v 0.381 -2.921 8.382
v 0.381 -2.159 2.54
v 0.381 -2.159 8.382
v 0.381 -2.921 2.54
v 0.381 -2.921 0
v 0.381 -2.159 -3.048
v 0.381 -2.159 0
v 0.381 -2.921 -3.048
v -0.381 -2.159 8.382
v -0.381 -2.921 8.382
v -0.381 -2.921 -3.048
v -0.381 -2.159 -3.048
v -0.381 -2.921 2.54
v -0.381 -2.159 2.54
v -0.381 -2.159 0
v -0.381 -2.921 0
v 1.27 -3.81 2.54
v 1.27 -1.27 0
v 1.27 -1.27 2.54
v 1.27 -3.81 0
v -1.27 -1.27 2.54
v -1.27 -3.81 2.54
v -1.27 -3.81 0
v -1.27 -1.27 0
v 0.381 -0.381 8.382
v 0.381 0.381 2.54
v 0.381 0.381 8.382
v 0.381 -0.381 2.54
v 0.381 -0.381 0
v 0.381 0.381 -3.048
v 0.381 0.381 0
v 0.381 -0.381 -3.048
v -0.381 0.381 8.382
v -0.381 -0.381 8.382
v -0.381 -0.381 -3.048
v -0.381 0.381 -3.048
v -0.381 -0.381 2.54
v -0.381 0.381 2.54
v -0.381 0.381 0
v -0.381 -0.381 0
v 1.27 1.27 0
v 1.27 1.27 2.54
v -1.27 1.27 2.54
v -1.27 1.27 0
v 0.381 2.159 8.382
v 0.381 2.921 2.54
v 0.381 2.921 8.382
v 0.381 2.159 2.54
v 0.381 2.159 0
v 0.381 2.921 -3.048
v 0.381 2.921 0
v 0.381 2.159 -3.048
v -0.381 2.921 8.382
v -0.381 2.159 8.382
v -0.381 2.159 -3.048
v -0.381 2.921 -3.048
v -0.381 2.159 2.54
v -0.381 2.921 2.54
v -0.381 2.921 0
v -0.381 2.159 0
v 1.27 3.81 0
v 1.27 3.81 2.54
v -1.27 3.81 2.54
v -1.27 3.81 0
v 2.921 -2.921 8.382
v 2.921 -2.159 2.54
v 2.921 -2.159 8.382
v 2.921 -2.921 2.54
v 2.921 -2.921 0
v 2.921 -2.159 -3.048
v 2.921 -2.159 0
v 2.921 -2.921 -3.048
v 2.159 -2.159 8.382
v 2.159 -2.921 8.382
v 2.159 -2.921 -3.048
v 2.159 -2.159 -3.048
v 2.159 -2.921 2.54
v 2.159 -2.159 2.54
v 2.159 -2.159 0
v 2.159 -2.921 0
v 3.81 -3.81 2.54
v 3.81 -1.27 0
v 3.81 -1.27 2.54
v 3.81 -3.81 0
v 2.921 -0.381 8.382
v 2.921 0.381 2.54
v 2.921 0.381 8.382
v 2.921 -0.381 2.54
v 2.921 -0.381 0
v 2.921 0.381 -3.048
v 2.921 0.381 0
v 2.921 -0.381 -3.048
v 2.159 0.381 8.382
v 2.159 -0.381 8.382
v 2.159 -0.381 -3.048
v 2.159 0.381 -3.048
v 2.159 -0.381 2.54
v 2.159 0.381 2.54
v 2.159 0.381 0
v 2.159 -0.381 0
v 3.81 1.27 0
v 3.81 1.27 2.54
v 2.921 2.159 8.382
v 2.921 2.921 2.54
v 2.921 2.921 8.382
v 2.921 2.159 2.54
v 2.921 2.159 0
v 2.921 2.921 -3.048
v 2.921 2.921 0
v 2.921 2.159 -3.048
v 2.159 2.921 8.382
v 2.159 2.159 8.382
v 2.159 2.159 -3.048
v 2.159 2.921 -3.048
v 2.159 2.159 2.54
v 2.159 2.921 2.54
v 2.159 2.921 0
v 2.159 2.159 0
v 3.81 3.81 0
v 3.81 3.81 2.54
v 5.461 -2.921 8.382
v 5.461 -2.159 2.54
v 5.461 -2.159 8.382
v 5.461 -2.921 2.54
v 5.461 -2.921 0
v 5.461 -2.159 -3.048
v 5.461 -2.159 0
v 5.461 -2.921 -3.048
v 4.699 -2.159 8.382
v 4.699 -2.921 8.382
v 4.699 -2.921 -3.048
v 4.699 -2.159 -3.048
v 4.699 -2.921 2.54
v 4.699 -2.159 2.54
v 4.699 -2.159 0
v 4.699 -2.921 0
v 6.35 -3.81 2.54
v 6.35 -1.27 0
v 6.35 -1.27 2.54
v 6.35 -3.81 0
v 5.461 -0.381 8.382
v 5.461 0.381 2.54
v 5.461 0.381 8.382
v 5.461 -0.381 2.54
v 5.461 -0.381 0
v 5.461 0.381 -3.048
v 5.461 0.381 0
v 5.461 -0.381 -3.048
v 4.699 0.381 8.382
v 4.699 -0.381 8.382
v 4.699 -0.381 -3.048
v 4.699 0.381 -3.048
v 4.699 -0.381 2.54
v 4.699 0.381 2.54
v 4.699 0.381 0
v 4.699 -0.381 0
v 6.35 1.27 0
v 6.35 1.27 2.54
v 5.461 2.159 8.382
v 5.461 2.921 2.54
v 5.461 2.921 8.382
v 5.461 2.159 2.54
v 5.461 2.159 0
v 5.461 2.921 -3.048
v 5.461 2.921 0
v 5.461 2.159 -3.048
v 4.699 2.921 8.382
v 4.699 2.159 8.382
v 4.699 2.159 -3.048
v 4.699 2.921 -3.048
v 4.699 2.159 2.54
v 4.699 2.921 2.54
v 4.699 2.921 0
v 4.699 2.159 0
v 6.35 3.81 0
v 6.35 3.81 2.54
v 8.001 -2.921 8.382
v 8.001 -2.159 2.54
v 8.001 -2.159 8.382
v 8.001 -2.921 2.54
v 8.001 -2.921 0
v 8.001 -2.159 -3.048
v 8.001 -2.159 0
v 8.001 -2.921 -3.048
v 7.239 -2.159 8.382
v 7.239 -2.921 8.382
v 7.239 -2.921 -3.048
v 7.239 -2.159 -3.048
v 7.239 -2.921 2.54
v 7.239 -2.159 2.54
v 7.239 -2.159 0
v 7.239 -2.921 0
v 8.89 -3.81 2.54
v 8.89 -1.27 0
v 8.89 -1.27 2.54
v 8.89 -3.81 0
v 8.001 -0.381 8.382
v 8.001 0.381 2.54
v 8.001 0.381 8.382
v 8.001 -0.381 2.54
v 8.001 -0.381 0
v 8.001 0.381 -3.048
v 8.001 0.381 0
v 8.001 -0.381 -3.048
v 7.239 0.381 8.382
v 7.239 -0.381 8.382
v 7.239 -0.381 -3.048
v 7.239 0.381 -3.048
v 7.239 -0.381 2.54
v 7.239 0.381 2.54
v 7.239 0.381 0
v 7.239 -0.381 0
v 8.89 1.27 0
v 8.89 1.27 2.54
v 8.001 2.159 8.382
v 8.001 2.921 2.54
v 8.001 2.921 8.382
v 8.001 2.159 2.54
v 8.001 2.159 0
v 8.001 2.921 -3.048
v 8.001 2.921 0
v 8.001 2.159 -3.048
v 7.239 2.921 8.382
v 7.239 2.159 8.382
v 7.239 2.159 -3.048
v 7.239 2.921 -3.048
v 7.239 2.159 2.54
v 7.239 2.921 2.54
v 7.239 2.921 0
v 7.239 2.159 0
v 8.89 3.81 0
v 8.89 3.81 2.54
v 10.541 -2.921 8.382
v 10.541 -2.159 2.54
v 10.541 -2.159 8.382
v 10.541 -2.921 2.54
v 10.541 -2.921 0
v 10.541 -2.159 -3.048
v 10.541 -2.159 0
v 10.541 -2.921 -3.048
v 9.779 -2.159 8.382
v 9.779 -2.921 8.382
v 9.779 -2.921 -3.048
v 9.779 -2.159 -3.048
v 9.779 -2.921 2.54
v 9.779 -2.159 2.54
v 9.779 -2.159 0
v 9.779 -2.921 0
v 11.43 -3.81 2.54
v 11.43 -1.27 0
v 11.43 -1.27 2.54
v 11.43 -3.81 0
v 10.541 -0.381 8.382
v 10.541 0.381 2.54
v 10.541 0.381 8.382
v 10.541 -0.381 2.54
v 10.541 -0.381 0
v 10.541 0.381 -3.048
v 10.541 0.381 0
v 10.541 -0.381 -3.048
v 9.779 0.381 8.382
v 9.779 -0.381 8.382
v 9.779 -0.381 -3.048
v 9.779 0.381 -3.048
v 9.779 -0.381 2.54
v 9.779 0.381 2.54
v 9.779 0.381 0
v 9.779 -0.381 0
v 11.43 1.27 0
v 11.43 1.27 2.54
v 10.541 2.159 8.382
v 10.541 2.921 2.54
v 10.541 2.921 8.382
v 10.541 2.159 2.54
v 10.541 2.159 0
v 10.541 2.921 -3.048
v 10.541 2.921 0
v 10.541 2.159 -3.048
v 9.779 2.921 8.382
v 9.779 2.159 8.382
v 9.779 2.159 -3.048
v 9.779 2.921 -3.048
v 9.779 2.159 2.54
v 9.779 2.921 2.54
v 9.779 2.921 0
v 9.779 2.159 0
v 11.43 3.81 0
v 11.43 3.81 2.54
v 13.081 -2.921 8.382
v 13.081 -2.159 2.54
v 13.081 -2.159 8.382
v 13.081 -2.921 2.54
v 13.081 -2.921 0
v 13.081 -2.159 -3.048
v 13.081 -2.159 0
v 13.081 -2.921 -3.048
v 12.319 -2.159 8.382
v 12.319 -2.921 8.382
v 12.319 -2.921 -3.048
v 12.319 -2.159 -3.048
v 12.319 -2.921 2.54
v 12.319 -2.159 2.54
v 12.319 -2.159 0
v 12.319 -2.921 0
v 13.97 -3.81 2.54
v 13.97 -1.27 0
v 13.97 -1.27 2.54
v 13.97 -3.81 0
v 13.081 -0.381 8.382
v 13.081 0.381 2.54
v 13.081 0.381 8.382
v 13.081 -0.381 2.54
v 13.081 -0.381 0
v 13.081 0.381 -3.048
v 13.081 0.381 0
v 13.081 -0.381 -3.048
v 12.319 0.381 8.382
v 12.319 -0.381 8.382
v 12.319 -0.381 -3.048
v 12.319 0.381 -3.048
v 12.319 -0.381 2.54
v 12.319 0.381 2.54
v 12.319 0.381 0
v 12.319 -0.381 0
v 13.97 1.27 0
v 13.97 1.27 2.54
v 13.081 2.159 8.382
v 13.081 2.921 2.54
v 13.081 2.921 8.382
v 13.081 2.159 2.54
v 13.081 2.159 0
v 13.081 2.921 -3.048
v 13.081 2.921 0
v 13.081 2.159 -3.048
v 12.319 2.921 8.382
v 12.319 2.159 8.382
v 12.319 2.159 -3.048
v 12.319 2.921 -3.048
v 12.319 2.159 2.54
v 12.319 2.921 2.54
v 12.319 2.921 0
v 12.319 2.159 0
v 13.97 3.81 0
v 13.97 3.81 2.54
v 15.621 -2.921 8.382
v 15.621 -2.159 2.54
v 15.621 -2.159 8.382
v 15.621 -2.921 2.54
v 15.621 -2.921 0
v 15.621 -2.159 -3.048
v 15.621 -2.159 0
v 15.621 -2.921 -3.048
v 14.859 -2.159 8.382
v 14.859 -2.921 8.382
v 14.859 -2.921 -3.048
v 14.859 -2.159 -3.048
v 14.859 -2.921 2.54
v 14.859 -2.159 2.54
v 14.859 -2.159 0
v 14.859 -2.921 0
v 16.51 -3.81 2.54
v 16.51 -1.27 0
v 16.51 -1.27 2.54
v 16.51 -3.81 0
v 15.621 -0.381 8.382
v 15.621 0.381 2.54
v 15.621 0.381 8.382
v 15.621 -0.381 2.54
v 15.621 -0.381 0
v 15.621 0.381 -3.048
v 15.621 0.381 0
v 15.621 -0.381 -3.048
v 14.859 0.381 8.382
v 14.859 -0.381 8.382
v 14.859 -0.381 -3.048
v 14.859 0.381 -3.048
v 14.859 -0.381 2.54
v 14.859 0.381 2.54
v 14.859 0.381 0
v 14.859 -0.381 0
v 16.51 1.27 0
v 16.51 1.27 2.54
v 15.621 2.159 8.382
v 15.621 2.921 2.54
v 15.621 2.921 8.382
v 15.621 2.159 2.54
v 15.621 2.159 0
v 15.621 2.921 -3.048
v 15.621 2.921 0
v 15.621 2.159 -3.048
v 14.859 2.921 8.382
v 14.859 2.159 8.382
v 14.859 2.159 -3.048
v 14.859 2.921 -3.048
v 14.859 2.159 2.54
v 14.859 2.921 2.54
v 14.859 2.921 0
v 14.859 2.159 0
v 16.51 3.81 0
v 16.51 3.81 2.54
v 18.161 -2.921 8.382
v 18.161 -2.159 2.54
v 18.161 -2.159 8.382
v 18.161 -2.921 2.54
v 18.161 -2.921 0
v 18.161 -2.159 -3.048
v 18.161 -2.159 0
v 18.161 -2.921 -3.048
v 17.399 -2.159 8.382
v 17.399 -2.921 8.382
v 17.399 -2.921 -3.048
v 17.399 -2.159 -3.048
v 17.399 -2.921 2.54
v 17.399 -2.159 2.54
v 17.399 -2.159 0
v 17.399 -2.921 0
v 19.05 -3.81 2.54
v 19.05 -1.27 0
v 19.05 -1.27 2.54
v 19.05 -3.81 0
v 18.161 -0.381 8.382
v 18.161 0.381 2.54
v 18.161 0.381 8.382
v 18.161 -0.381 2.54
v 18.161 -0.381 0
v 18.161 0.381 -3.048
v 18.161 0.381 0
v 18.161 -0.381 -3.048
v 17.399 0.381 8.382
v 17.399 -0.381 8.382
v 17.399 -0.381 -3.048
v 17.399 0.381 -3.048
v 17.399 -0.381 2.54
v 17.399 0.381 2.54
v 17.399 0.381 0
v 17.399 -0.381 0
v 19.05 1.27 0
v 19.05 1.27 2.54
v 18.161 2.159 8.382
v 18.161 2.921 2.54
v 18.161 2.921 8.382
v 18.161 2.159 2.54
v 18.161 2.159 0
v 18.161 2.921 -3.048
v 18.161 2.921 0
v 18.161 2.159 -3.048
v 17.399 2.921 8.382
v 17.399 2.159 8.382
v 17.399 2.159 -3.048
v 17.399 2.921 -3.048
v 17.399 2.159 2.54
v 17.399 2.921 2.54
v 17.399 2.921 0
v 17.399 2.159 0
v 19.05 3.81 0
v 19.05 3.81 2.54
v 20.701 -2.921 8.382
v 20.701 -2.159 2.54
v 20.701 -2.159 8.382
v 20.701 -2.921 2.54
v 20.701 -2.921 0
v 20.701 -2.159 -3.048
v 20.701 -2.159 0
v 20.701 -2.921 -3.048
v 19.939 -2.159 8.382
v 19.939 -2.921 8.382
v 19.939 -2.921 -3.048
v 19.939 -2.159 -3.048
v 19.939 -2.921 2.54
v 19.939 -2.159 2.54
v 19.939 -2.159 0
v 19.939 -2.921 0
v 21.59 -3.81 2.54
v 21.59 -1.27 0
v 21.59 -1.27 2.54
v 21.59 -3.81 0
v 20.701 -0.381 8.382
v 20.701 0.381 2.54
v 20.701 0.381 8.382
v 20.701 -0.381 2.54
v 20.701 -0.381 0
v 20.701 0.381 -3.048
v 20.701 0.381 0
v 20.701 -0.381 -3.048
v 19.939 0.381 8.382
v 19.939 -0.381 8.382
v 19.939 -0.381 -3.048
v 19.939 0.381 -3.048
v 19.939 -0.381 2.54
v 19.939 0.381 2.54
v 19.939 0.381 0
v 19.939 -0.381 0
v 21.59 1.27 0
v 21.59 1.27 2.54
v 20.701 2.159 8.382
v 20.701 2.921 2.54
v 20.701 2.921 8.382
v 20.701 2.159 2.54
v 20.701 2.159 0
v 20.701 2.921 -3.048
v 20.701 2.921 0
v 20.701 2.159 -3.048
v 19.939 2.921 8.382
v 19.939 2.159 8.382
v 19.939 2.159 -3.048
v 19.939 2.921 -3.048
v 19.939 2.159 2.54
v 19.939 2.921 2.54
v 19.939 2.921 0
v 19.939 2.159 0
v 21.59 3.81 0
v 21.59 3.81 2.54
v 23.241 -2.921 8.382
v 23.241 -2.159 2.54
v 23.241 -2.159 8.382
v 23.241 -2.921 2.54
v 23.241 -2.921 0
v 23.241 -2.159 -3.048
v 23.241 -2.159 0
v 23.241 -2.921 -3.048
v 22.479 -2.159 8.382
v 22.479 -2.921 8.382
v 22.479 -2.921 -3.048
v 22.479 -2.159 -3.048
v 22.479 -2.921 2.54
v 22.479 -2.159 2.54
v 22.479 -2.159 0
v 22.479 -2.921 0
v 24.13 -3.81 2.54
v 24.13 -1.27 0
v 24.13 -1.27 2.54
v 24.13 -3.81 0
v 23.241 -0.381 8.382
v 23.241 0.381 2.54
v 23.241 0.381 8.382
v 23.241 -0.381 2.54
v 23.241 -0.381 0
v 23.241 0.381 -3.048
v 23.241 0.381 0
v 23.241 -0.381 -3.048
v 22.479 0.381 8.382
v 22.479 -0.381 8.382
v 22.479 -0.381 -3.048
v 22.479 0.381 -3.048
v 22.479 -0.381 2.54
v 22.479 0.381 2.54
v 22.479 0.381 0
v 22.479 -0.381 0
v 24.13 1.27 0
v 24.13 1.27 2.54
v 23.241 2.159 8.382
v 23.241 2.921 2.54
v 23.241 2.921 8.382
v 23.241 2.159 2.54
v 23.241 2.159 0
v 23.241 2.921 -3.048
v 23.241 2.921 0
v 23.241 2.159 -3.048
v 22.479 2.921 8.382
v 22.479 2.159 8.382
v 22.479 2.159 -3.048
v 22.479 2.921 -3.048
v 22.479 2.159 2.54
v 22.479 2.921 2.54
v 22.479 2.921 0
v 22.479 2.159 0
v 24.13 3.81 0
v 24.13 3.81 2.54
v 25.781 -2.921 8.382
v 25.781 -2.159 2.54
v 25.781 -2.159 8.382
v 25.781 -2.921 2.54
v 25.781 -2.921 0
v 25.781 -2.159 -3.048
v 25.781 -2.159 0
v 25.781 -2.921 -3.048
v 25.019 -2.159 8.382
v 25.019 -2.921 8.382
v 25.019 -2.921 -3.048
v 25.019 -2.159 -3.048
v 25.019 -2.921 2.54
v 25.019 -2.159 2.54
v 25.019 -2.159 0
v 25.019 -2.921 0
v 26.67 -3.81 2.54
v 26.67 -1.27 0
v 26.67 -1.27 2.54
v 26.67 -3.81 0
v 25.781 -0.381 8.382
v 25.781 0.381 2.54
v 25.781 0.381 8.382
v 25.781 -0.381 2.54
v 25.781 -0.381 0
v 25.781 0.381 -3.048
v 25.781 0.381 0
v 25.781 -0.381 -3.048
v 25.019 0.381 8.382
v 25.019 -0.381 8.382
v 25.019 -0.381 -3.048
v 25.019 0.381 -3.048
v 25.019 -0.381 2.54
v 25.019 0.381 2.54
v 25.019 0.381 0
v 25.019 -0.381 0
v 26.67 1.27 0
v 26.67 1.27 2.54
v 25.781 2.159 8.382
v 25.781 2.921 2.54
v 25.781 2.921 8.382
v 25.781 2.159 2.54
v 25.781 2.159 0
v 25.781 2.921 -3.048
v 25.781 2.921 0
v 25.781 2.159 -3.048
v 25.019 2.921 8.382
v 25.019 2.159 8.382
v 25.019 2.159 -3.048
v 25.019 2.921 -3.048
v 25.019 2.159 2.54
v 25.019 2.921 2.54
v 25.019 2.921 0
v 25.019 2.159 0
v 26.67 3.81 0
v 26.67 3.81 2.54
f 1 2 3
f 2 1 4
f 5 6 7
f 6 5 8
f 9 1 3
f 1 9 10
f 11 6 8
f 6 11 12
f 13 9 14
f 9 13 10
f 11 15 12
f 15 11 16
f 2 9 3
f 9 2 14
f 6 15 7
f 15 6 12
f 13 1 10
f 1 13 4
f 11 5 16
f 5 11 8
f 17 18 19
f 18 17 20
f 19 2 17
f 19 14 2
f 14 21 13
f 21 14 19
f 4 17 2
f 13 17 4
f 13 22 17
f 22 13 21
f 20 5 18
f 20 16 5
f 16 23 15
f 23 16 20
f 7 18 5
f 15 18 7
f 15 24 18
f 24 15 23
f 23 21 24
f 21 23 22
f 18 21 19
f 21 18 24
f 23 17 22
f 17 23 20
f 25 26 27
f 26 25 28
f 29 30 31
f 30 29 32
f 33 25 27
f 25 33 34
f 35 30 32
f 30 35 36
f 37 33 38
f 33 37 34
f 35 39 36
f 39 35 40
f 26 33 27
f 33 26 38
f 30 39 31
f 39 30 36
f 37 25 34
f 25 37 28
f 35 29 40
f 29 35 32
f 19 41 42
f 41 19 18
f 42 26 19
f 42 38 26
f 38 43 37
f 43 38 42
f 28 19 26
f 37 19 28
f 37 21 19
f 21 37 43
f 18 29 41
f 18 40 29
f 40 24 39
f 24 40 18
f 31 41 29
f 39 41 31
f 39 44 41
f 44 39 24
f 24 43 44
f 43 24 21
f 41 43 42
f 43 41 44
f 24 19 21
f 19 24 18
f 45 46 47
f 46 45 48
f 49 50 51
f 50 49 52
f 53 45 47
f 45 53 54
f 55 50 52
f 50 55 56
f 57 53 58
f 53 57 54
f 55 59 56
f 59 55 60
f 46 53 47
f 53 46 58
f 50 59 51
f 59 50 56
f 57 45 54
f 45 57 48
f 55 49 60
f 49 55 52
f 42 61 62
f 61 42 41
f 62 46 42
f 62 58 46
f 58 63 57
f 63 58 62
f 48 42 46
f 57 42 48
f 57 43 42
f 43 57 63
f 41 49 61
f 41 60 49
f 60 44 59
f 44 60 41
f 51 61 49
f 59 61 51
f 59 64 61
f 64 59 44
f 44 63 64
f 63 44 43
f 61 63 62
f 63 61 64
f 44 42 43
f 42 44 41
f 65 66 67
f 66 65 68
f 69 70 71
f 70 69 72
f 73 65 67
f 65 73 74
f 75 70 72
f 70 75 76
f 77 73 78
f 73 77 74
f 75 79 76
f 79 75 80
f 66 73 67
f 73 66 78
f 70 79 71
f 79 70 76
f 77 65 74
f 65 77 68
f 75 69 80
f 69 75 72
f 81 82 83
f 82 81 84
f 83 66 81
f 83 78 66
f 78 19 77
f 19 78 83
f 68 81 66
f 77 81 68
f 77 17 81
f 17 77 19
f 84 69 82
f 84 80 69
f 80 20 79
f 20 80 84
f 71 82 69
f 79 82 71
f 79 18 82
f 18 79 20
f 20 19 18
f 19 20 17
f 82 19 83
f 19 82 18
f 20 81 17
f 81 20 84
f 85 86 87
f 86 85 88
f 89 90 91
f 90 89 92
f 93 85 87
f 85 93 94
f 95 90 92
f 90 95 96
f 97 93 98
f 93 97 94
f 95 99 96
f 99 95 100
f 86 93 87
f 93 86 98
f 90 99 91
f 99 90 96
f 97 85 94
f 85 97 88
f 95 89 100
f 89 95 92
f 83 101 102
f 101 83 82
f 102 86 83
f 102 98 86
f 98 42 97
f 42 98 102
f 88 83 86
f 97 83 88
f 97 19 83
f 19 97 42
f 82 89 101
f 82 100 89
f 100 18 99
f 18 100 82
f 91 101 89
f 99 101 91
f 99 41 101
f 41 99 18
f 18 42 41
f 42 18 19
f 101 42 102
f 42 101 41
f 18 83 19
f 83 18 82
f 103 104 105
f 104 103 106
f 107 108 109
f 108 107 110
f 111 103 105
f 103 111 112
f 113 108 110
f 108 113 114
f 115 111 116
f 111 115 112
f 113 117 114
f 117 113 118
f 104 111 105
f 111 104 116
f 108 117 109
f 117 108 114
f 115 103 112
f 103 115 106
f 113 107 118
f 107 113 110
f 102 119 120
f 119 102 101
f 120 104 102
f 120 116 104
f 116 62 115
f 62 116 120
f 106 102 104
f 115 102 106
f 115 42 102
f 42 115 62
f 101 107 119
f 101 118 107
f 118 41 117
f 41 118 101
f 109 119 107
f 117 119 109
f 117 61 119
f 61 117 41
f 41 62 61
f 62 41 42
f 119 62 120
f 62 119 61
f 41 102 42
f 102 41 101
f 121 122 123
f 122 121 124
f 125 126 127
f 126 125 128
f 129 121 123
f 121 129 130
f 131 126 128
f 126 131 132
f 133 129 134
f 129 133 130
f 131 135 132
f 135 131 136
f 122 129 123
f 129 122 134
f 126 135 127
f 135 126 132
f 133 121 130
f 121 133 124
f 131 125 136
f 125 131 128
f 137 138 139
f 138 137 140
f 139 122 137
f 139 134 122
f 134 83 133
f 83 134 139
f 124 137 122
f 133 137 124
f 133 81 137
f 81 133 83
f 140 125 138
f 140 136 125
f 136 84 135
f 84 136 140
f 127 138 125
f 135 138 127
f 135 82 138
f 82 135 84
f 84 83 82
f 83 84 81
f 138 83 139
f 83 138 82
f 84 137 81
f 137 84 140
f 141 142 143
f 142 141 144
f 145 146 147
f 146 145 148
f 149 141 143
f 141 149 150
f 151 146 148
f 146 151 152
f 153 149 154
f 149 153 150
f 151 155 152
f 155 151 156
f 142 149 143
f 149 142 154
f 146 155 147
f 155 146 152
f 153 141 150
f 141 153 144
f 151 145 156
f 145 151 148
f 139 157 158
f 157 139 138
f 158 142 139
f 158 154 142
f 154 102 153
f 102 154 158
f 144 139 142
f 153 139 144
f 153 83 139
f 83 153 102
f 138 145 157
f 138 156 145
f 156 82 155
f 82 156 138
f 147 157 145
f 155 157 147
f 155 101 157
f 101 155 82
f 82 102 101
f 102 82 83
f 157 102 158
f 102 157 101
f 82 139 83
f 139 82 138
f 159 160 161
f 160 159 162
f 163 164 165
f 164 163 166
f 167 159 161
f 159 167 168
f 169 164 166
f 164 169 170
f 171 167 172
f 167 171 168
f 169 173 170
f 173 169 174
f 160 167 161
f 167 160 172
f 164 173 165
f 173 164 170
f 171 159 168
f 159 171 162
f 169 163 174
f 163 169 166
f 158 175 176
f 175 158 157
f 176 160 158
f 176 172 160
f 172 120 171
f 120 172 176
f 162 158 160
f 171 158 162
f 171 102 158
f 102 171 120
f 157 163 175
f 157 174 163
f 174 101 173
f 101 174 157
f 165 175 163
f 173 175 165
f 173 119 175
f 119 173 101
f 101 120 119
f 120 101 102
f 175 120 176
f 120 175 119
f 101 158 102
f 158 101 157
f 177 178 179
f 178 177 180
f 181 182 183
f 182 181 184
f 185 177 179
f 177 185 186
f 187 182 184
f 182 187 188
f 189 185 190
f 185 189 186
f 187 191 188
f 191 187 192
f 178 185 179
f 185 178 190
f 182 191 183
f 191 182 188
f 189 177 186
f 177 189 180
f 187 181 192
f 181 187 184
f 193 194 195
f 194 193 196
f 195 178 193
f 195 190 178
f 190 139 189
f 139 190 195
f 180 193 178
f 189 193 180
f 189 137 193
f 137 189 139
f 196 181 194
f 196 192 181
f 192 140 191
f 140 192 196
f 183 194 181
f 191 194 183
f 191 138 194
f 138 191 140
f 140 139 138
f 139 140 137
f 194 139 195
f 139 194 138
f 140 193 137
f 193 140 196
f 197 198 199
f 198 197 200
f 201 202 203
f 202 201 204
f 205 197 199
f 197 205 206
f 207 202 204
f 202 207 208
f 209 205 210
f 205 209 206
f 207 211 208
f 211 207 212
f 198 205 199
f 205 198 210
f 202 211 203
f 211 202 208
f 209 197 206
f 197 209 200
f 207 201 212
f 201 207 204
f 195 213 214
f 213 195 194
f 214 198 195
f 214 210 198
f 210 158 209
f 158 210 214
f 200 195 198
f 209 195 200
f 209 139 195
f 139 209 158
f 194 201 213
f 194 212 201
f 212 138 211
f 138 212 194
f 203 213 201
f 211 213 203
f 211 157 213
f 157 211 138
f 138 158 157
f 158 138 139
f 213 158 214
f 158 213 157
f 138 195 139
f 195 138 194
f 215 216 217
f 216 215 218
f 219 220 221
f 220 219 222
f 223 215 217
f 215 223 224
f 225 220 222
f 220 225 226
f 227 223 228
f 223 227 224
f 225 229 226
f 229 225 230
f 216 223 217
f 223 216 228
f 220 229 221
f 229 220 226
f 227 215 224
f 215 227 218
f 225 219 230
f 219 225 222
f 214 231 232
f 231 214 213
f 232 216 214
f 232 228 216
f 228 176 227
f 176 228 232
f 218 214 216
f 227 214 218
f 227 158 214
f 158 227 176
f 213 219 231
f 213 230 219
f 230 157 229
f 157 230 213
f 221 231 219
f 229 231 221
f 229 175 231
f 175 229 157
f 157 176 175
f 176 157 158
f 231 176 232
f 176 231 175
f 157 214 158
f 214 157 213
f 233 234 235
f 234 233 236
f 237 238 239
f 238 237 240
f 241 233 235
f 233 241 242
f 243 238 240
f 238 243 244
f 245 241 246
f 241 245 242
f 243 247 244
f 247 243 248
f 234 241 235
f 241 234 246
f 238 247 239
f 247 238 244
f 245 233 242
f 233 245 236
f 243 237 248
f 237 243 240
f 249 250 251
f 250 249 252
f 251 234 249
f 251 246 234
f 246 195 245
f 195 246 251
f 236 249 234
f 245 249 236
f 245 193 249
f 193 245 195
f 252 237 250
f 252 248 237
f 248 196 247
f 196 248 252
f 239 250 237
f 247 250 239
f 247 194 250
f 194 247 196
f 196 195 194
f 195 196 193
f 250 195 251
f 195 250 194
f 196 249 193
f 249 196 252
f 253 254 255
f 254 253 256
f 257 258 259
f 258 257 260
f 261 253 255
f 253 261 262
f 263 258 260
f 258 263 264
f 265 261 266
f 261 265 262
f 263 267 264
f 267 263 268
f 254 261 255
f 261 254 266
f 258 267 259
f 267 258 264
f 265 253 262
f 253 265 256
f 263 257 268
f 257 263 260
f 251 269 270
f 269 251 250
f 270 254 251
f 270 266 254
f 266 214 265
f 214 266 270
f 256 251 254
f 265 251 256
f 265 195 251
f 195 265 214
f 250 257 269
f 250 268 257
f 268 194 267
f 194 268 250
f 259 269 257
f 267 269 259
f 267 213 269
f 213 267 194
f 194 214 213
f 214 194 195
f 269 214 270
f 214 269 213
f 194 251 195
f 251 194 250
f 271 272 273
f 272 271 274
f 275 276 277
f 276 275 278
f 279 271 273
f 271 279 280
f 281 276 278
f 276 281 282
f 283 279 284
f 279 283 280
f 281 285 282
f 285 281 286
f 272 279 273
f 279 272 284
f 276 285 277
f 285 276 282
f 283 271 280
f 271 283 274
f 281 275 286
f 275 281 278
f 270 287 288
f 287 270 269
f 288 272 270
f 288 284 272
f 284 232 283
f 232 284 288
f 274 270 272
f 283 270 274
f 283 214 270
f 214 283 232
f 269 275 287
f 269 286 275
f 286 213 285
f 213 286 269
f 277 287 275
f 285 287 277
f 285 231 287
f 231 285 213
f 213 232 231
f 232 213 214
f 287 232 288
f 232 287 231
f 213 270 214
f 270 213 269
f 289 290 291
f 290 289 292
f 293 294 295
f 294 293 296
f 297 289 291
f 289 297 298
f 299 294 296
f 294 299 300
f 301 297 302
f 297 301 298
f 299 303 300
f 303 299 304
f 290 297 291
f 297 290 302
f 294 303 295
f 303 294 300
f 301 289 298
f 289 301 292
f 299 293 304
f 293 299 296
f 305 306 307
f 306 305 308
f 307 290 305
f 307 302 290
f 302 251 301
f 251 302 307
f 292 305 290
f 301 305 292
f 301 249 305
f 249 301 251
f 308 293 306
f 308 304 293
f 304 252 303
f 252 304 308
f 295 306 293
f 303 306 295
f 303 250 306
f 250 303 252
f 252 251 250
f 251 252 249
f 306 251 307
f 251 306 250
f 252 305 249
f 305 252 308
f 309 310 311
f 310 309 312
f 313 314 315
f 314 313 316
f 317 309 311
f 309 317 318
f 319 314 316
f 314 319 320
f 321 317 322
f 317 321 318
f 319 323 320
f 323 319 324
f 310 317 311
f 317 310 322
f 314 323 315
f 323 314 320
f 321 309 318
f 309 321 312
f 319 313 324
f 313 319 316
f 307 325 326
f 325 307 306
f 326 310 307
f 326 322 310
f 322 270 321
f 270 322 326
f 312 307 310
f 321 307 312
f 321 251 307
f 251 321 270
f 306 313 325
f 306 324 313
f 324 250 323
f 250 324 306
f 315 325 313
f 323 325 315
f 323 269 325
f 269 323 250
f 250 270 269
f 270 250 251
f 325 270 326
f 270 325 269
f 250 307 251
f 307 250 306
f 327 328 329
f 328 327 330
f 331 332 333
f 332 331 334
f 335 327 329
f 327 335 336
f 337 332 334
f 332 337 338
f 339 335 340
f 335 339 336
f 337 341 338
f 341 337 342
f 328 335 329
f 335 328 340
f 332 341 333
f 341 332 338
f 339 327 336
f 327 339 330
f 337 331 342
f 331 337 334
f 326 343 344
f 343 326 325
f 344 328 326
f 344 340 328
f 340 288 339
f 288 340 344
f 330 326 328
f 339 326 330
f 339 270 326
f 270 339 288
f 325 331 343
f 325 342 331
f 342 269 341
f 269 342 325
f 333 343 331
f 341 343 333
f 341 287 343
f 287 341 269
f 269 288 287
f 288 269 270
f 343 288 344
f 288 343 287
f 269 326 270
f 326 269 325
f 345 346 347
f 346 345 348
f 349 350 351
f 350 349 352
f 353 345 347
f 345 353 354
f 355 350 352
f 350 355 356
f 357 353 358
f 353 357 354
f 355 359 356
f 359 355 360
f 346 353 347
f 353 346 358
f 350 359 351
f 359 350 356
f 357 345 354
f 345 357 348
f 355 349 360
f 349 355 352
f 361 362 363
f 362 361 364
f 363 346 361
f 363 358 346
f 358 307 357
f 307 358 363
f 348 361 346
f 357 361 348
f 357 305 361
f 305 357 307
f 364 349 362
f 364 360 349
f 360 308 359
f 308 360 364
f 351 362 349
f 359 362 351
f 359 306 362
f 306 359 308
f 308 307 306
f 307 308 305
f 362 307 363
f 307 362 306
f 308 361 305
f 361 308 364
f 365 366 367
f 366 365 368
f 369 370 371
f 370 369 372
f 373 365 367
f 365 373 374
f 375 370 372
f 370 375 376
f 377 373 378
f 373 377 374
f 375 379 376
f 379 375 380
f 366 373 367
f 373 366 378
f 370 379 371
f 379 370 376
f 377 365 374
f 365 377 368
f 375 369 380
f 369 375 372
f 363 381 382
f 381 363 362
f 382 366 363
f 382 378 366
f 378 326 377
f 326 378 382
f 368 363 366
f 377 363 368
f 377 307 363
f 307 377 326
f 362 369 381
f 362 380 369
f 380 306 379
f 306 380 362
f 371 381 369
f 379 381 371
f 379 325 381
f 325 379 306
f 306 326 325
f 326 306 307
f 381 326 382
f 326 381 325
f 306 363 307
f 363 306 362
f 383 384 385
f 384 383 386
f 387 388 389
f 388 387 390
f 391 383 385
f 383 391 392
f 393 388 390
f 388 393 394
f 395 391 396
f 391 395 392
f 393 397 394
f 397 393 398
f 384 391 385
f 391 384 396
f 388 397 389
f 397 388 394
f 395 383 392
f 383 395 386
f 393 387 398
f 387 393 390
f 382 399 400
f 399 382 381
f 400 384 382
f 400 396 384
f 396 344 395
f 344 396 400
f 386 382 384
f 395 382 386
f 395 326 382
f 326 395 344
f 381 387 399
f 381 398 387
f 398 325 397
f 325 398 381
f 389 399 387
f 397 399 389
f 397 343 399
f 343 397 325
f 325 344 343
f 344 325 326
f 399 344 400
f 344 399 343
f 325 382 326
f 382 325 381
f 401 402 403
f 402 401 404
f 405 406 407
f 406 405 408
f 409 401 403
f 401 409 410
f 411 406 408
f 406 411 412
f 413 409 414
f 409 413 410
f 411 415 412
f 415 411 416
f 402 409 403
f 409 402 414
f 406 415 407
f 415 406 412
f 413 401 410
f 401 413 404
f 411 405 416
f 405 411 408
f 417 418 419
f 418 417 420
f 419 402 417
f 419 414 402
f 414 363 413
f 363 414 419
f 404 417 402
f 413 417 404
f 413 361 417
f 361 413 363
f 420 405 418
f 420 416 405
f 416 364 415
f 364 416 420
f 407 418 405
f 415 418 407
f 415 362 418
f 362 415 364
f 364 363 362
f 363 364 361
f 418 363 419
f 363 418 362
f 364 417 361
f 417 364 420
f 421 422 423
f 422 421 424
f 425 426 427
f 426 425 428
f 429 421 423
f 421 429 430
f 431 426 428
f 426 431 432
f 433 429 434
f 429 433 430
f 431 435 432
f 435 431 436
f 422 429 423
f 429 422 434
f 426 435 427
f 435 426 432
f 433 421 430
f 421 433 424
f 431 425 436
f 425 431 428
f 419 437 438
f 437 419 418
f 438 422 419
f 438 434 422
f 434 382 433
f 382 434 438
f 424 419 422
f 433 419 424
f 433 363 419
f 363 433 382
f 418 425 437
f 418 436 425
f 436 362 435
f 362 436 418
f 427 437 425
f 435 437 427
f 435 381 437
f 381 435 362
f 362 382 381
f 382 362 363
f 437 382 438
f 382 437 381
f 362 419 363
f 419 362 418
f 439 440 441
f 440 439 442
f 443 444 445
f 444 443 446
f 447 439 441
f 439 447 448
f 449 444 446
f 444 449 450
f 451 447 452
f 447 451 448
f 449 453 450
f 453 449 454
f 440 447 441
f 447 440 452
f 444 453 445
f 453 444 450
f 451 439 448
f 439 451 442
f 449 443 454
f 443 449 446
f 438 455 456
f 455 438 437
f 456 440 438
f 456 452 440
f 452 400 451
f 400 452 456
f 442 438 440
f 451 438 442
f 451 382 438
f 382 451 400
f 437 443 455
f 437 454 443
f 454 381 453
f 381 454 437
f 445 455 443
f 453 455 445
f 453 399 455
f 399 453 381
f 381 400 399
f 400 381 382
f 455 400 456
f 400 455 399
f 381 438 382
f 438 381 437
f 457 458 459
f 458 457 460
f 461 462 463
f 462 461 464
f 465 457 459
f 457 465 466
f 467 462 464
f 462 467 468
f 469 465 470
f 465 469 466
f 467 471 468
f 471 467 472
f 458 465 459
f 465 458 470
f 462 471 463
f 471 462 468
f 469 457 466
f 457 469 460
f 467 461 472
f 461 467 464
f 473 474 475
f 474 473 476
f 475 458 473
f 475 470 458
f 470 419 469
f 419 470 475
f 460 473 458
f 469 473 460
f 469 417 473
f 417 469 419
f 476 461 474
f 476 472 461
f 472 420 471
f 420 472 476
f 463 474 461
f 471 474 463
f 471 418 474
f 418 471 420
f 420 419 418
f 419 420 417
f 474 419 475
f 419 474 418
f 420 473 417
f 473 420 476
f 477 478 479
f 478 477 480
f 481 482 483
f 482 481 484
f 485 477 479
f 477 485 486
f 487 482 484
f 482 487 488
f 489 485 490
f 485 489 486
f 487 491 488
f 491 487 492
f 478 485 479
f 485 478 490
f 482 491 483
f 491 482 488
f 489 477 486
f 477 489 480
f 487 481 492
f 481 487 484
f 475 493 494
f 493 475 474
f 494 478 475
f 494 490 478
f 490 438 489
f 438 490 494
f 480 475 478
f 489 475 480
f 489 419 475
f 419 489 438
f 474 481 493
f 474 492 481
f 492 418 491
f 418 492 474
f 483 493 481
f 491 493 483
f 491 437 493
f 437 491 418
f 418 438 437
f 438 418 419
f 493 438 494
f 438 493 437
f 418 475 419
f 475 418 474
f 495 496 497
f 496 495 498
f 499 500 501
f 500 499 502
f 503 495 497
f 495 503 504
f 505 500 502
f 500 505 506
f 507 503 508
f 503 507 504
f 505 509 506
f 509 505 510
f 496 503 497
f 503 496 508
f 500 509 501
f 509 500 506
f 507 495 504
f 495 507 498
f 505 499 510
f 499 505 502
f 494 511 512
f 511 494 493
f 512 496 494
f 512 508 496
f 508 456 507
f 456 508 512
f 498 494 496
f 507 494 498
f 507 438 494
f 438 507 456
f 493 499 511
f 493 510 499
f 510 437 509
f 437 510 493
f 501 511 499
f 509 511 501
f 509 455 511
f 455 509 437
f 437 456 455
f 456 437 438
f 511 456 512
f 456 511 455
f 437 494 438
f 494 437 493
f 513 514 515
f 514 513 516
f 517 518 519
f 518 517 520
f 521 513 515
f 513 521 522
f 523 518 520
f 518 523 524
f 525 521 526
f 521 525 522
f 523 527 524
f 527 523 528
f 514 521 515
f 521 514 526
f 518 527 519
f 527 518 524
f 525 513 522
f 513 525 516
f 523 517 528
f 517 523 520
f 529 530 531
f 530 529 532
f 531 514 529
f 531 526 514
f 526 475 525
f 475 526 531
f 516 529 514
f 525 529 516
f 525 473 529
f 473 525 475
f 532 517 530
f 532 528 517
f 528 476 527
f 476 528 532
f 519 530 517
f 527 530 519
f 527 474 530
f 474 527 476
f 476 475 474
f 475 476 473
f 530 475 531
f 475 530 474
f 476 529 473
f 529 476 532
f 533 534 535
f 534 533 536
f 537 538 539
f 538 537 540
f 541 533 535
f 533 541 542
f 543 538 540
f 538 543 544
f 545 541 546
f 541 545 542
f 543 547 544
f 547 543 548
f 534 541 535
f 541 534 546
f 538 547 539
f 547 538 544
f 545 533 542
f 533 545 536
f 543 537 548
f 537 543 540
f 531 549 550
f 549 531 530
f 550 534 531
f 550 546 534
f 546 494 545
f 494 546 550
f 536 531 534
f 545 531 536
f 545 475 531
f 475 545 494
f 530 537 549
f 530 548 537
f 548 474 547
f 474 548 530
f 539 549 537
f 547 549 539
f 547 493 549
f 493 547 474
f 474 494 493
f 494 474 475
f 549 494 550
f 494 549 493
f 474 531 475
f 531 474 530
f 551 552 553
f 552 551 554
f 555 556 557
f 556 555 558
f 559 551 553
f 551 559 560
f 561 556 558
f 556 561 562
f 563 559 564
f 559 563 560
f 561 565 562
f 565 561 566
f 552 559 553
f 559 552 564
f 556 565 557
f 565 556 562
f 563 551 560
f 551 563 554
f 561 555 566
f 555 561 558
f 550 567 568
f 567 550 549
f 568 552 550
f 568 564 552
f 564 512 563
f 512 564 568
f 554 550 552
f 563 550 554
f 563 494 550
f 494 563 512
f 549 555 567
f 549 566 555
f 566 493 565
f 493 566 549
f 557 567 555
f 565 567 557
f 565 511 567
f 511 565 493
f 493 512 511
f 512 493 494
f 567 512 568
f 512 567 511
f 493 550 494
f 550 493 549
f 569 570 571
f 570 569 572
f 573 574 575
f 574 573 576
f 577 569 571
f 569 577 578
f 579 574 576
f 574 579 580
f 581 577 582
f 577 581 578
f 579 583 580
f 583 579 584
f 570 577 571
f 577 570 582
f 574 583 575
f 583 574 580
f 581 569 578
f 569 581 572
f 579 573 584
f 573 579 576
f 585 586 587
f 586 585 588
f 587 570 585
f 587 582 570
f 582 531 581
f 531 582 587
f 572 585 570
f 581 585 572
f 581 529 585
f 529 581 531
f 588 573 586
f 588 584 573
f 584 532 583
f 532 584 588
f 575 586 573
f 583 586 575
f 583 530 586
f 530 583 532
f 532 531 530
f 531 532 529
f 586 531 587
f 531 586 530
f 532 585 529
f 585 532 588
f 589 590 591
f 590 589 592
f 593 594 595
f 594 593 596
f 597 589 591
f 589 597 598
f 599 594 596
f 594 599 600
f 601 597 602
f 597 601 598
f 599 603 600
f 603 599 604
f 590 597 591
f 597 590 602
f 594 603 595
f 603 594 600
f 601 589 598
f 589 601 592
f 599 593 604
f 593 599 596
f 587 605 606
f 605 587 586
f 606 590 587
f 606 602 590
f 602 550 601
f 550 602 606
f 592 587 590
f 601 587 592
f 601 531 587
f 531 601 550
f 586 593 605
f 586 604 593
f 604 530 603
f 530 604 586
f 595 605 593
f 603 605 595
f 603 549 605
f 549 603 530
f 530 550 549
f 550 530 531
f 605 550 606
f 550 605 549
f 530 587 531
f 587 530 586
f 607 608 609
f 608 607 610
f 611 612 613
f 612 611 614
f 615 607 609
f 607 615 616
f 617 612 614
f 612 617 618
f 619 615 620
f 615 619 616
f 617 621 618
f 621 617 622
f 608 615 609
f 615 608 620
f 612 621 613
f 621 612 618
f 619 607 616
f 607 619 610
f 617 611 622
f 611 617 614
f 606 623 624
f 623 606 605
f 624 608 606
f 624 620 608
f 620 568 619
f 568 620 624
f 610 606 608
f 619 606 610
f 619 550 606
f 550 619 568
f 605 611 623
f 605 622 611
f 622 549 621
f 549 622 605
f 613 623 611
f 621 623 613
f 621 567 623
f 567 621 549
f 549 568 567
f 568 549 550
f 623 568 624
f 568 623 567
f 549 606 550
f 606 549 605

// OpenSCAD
module pin(){
    millis= 0.0254;
    pin=    30*millis;
    pinH=   450*millis;
    space=  100*millis;
    cut=    10*millis;
    mXY=[   [0,0,0], 
            [0,1,0],
            [1,0,0],
            [1,1,0]]; //mirror XY
    
    color("gold")
    translate ([-pin/2,-pin/2,-120*millis]) cube([pin,pin,pinH]);    
    color("gray") 
    difference(){
        translate(-[space,space]/2) cube([space,space,space]);
//        for (i=mXY) mirror(i) translate([space,space]/2)cylinder(space,cut,cut,$fn=8);
    }
}
for (x=[0:1:10], y=[-1:1:+1]) translate([x*2.54,y*2.54,0]) pin();
